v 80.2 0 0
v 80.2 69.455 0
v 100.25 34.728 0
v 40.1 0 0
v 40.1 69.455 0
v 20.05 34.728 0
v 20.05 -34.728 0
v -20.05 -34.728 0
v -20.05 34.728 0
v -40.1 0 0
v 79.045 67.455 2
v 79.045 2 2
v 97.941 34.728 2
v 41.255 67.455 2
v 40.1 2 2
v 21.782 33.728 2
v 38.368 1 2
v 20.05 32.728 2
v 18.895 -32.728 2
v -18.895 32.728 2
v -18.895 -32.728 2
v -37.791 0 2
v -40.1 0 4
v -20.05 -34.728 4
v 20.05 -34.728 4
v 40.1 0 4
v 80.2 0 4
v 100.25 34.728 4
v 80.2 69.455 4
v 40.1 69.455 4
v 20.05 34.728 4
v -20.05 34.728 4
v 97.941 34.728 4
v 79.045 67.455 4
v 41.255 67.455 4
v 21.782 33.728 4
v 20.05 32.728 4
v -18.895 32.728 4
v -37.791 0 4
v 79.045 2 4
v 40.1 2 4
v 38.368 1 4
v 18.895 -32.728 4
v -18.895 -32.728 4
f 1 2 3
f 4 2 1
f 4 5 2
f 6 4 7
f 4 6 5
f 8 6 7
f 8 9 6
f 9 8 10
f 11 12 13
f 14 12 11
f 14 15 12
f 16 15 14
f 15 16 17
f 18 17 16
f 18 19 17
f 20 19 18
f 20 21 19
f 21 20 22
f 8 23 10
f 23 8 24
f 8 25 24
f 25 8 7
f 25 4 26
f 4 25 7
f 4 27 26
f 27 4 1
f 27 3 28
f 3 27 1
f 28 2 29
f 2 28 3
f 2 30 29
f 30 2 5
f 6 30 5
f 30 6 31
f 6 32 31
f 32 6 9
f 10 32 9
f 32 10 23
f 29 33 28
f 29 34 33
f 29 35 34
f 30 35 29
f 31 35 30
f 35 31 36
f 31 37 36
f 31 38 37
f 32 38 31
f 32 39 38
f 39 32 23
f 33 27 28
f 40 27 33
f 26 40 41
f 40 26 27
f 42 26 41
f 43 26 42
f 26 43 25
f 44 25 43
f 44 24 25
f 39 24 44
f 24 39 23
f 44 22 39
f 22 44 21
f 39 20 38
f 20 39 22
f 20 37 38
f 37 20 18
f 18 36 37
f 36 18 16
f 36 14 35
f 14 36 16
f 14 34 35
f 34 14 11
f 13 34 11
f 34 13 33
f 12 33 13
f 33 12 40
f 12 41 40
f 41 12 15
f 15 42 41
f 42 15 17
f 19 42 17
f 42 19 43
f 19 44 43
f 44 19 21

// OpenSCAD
inch = 25.4;
hex_h = 2;
border_height = 2;
border_thickness = 2;
hex_r = 1.5 * inch;
num_hexs = 2;

module hexagons(count) {
    radius = hex_r + border_thickness;
    union() {
        for (i = [1 : count]) {
            x_offset = radius * 1.5 * (i - 1);
            y_offset = cos(30) * radius * (i - 1);
            
            translate([x_offset, y_offset, 0]) {
                circle(r = radius, $fn = 6);
            }
        }
    }
}

// the object itself
linear_extrude(hex_h) {
   hexagons(num_hexs);
}

linear_extrude(hex_h + border_height) {
    difference() {
        // outer boundary
        hexagons(num_hexs);
        // remove an inset copy
        offset(-border_thickness) {
            hexagons(num_hexs); 
        }
    }
}
